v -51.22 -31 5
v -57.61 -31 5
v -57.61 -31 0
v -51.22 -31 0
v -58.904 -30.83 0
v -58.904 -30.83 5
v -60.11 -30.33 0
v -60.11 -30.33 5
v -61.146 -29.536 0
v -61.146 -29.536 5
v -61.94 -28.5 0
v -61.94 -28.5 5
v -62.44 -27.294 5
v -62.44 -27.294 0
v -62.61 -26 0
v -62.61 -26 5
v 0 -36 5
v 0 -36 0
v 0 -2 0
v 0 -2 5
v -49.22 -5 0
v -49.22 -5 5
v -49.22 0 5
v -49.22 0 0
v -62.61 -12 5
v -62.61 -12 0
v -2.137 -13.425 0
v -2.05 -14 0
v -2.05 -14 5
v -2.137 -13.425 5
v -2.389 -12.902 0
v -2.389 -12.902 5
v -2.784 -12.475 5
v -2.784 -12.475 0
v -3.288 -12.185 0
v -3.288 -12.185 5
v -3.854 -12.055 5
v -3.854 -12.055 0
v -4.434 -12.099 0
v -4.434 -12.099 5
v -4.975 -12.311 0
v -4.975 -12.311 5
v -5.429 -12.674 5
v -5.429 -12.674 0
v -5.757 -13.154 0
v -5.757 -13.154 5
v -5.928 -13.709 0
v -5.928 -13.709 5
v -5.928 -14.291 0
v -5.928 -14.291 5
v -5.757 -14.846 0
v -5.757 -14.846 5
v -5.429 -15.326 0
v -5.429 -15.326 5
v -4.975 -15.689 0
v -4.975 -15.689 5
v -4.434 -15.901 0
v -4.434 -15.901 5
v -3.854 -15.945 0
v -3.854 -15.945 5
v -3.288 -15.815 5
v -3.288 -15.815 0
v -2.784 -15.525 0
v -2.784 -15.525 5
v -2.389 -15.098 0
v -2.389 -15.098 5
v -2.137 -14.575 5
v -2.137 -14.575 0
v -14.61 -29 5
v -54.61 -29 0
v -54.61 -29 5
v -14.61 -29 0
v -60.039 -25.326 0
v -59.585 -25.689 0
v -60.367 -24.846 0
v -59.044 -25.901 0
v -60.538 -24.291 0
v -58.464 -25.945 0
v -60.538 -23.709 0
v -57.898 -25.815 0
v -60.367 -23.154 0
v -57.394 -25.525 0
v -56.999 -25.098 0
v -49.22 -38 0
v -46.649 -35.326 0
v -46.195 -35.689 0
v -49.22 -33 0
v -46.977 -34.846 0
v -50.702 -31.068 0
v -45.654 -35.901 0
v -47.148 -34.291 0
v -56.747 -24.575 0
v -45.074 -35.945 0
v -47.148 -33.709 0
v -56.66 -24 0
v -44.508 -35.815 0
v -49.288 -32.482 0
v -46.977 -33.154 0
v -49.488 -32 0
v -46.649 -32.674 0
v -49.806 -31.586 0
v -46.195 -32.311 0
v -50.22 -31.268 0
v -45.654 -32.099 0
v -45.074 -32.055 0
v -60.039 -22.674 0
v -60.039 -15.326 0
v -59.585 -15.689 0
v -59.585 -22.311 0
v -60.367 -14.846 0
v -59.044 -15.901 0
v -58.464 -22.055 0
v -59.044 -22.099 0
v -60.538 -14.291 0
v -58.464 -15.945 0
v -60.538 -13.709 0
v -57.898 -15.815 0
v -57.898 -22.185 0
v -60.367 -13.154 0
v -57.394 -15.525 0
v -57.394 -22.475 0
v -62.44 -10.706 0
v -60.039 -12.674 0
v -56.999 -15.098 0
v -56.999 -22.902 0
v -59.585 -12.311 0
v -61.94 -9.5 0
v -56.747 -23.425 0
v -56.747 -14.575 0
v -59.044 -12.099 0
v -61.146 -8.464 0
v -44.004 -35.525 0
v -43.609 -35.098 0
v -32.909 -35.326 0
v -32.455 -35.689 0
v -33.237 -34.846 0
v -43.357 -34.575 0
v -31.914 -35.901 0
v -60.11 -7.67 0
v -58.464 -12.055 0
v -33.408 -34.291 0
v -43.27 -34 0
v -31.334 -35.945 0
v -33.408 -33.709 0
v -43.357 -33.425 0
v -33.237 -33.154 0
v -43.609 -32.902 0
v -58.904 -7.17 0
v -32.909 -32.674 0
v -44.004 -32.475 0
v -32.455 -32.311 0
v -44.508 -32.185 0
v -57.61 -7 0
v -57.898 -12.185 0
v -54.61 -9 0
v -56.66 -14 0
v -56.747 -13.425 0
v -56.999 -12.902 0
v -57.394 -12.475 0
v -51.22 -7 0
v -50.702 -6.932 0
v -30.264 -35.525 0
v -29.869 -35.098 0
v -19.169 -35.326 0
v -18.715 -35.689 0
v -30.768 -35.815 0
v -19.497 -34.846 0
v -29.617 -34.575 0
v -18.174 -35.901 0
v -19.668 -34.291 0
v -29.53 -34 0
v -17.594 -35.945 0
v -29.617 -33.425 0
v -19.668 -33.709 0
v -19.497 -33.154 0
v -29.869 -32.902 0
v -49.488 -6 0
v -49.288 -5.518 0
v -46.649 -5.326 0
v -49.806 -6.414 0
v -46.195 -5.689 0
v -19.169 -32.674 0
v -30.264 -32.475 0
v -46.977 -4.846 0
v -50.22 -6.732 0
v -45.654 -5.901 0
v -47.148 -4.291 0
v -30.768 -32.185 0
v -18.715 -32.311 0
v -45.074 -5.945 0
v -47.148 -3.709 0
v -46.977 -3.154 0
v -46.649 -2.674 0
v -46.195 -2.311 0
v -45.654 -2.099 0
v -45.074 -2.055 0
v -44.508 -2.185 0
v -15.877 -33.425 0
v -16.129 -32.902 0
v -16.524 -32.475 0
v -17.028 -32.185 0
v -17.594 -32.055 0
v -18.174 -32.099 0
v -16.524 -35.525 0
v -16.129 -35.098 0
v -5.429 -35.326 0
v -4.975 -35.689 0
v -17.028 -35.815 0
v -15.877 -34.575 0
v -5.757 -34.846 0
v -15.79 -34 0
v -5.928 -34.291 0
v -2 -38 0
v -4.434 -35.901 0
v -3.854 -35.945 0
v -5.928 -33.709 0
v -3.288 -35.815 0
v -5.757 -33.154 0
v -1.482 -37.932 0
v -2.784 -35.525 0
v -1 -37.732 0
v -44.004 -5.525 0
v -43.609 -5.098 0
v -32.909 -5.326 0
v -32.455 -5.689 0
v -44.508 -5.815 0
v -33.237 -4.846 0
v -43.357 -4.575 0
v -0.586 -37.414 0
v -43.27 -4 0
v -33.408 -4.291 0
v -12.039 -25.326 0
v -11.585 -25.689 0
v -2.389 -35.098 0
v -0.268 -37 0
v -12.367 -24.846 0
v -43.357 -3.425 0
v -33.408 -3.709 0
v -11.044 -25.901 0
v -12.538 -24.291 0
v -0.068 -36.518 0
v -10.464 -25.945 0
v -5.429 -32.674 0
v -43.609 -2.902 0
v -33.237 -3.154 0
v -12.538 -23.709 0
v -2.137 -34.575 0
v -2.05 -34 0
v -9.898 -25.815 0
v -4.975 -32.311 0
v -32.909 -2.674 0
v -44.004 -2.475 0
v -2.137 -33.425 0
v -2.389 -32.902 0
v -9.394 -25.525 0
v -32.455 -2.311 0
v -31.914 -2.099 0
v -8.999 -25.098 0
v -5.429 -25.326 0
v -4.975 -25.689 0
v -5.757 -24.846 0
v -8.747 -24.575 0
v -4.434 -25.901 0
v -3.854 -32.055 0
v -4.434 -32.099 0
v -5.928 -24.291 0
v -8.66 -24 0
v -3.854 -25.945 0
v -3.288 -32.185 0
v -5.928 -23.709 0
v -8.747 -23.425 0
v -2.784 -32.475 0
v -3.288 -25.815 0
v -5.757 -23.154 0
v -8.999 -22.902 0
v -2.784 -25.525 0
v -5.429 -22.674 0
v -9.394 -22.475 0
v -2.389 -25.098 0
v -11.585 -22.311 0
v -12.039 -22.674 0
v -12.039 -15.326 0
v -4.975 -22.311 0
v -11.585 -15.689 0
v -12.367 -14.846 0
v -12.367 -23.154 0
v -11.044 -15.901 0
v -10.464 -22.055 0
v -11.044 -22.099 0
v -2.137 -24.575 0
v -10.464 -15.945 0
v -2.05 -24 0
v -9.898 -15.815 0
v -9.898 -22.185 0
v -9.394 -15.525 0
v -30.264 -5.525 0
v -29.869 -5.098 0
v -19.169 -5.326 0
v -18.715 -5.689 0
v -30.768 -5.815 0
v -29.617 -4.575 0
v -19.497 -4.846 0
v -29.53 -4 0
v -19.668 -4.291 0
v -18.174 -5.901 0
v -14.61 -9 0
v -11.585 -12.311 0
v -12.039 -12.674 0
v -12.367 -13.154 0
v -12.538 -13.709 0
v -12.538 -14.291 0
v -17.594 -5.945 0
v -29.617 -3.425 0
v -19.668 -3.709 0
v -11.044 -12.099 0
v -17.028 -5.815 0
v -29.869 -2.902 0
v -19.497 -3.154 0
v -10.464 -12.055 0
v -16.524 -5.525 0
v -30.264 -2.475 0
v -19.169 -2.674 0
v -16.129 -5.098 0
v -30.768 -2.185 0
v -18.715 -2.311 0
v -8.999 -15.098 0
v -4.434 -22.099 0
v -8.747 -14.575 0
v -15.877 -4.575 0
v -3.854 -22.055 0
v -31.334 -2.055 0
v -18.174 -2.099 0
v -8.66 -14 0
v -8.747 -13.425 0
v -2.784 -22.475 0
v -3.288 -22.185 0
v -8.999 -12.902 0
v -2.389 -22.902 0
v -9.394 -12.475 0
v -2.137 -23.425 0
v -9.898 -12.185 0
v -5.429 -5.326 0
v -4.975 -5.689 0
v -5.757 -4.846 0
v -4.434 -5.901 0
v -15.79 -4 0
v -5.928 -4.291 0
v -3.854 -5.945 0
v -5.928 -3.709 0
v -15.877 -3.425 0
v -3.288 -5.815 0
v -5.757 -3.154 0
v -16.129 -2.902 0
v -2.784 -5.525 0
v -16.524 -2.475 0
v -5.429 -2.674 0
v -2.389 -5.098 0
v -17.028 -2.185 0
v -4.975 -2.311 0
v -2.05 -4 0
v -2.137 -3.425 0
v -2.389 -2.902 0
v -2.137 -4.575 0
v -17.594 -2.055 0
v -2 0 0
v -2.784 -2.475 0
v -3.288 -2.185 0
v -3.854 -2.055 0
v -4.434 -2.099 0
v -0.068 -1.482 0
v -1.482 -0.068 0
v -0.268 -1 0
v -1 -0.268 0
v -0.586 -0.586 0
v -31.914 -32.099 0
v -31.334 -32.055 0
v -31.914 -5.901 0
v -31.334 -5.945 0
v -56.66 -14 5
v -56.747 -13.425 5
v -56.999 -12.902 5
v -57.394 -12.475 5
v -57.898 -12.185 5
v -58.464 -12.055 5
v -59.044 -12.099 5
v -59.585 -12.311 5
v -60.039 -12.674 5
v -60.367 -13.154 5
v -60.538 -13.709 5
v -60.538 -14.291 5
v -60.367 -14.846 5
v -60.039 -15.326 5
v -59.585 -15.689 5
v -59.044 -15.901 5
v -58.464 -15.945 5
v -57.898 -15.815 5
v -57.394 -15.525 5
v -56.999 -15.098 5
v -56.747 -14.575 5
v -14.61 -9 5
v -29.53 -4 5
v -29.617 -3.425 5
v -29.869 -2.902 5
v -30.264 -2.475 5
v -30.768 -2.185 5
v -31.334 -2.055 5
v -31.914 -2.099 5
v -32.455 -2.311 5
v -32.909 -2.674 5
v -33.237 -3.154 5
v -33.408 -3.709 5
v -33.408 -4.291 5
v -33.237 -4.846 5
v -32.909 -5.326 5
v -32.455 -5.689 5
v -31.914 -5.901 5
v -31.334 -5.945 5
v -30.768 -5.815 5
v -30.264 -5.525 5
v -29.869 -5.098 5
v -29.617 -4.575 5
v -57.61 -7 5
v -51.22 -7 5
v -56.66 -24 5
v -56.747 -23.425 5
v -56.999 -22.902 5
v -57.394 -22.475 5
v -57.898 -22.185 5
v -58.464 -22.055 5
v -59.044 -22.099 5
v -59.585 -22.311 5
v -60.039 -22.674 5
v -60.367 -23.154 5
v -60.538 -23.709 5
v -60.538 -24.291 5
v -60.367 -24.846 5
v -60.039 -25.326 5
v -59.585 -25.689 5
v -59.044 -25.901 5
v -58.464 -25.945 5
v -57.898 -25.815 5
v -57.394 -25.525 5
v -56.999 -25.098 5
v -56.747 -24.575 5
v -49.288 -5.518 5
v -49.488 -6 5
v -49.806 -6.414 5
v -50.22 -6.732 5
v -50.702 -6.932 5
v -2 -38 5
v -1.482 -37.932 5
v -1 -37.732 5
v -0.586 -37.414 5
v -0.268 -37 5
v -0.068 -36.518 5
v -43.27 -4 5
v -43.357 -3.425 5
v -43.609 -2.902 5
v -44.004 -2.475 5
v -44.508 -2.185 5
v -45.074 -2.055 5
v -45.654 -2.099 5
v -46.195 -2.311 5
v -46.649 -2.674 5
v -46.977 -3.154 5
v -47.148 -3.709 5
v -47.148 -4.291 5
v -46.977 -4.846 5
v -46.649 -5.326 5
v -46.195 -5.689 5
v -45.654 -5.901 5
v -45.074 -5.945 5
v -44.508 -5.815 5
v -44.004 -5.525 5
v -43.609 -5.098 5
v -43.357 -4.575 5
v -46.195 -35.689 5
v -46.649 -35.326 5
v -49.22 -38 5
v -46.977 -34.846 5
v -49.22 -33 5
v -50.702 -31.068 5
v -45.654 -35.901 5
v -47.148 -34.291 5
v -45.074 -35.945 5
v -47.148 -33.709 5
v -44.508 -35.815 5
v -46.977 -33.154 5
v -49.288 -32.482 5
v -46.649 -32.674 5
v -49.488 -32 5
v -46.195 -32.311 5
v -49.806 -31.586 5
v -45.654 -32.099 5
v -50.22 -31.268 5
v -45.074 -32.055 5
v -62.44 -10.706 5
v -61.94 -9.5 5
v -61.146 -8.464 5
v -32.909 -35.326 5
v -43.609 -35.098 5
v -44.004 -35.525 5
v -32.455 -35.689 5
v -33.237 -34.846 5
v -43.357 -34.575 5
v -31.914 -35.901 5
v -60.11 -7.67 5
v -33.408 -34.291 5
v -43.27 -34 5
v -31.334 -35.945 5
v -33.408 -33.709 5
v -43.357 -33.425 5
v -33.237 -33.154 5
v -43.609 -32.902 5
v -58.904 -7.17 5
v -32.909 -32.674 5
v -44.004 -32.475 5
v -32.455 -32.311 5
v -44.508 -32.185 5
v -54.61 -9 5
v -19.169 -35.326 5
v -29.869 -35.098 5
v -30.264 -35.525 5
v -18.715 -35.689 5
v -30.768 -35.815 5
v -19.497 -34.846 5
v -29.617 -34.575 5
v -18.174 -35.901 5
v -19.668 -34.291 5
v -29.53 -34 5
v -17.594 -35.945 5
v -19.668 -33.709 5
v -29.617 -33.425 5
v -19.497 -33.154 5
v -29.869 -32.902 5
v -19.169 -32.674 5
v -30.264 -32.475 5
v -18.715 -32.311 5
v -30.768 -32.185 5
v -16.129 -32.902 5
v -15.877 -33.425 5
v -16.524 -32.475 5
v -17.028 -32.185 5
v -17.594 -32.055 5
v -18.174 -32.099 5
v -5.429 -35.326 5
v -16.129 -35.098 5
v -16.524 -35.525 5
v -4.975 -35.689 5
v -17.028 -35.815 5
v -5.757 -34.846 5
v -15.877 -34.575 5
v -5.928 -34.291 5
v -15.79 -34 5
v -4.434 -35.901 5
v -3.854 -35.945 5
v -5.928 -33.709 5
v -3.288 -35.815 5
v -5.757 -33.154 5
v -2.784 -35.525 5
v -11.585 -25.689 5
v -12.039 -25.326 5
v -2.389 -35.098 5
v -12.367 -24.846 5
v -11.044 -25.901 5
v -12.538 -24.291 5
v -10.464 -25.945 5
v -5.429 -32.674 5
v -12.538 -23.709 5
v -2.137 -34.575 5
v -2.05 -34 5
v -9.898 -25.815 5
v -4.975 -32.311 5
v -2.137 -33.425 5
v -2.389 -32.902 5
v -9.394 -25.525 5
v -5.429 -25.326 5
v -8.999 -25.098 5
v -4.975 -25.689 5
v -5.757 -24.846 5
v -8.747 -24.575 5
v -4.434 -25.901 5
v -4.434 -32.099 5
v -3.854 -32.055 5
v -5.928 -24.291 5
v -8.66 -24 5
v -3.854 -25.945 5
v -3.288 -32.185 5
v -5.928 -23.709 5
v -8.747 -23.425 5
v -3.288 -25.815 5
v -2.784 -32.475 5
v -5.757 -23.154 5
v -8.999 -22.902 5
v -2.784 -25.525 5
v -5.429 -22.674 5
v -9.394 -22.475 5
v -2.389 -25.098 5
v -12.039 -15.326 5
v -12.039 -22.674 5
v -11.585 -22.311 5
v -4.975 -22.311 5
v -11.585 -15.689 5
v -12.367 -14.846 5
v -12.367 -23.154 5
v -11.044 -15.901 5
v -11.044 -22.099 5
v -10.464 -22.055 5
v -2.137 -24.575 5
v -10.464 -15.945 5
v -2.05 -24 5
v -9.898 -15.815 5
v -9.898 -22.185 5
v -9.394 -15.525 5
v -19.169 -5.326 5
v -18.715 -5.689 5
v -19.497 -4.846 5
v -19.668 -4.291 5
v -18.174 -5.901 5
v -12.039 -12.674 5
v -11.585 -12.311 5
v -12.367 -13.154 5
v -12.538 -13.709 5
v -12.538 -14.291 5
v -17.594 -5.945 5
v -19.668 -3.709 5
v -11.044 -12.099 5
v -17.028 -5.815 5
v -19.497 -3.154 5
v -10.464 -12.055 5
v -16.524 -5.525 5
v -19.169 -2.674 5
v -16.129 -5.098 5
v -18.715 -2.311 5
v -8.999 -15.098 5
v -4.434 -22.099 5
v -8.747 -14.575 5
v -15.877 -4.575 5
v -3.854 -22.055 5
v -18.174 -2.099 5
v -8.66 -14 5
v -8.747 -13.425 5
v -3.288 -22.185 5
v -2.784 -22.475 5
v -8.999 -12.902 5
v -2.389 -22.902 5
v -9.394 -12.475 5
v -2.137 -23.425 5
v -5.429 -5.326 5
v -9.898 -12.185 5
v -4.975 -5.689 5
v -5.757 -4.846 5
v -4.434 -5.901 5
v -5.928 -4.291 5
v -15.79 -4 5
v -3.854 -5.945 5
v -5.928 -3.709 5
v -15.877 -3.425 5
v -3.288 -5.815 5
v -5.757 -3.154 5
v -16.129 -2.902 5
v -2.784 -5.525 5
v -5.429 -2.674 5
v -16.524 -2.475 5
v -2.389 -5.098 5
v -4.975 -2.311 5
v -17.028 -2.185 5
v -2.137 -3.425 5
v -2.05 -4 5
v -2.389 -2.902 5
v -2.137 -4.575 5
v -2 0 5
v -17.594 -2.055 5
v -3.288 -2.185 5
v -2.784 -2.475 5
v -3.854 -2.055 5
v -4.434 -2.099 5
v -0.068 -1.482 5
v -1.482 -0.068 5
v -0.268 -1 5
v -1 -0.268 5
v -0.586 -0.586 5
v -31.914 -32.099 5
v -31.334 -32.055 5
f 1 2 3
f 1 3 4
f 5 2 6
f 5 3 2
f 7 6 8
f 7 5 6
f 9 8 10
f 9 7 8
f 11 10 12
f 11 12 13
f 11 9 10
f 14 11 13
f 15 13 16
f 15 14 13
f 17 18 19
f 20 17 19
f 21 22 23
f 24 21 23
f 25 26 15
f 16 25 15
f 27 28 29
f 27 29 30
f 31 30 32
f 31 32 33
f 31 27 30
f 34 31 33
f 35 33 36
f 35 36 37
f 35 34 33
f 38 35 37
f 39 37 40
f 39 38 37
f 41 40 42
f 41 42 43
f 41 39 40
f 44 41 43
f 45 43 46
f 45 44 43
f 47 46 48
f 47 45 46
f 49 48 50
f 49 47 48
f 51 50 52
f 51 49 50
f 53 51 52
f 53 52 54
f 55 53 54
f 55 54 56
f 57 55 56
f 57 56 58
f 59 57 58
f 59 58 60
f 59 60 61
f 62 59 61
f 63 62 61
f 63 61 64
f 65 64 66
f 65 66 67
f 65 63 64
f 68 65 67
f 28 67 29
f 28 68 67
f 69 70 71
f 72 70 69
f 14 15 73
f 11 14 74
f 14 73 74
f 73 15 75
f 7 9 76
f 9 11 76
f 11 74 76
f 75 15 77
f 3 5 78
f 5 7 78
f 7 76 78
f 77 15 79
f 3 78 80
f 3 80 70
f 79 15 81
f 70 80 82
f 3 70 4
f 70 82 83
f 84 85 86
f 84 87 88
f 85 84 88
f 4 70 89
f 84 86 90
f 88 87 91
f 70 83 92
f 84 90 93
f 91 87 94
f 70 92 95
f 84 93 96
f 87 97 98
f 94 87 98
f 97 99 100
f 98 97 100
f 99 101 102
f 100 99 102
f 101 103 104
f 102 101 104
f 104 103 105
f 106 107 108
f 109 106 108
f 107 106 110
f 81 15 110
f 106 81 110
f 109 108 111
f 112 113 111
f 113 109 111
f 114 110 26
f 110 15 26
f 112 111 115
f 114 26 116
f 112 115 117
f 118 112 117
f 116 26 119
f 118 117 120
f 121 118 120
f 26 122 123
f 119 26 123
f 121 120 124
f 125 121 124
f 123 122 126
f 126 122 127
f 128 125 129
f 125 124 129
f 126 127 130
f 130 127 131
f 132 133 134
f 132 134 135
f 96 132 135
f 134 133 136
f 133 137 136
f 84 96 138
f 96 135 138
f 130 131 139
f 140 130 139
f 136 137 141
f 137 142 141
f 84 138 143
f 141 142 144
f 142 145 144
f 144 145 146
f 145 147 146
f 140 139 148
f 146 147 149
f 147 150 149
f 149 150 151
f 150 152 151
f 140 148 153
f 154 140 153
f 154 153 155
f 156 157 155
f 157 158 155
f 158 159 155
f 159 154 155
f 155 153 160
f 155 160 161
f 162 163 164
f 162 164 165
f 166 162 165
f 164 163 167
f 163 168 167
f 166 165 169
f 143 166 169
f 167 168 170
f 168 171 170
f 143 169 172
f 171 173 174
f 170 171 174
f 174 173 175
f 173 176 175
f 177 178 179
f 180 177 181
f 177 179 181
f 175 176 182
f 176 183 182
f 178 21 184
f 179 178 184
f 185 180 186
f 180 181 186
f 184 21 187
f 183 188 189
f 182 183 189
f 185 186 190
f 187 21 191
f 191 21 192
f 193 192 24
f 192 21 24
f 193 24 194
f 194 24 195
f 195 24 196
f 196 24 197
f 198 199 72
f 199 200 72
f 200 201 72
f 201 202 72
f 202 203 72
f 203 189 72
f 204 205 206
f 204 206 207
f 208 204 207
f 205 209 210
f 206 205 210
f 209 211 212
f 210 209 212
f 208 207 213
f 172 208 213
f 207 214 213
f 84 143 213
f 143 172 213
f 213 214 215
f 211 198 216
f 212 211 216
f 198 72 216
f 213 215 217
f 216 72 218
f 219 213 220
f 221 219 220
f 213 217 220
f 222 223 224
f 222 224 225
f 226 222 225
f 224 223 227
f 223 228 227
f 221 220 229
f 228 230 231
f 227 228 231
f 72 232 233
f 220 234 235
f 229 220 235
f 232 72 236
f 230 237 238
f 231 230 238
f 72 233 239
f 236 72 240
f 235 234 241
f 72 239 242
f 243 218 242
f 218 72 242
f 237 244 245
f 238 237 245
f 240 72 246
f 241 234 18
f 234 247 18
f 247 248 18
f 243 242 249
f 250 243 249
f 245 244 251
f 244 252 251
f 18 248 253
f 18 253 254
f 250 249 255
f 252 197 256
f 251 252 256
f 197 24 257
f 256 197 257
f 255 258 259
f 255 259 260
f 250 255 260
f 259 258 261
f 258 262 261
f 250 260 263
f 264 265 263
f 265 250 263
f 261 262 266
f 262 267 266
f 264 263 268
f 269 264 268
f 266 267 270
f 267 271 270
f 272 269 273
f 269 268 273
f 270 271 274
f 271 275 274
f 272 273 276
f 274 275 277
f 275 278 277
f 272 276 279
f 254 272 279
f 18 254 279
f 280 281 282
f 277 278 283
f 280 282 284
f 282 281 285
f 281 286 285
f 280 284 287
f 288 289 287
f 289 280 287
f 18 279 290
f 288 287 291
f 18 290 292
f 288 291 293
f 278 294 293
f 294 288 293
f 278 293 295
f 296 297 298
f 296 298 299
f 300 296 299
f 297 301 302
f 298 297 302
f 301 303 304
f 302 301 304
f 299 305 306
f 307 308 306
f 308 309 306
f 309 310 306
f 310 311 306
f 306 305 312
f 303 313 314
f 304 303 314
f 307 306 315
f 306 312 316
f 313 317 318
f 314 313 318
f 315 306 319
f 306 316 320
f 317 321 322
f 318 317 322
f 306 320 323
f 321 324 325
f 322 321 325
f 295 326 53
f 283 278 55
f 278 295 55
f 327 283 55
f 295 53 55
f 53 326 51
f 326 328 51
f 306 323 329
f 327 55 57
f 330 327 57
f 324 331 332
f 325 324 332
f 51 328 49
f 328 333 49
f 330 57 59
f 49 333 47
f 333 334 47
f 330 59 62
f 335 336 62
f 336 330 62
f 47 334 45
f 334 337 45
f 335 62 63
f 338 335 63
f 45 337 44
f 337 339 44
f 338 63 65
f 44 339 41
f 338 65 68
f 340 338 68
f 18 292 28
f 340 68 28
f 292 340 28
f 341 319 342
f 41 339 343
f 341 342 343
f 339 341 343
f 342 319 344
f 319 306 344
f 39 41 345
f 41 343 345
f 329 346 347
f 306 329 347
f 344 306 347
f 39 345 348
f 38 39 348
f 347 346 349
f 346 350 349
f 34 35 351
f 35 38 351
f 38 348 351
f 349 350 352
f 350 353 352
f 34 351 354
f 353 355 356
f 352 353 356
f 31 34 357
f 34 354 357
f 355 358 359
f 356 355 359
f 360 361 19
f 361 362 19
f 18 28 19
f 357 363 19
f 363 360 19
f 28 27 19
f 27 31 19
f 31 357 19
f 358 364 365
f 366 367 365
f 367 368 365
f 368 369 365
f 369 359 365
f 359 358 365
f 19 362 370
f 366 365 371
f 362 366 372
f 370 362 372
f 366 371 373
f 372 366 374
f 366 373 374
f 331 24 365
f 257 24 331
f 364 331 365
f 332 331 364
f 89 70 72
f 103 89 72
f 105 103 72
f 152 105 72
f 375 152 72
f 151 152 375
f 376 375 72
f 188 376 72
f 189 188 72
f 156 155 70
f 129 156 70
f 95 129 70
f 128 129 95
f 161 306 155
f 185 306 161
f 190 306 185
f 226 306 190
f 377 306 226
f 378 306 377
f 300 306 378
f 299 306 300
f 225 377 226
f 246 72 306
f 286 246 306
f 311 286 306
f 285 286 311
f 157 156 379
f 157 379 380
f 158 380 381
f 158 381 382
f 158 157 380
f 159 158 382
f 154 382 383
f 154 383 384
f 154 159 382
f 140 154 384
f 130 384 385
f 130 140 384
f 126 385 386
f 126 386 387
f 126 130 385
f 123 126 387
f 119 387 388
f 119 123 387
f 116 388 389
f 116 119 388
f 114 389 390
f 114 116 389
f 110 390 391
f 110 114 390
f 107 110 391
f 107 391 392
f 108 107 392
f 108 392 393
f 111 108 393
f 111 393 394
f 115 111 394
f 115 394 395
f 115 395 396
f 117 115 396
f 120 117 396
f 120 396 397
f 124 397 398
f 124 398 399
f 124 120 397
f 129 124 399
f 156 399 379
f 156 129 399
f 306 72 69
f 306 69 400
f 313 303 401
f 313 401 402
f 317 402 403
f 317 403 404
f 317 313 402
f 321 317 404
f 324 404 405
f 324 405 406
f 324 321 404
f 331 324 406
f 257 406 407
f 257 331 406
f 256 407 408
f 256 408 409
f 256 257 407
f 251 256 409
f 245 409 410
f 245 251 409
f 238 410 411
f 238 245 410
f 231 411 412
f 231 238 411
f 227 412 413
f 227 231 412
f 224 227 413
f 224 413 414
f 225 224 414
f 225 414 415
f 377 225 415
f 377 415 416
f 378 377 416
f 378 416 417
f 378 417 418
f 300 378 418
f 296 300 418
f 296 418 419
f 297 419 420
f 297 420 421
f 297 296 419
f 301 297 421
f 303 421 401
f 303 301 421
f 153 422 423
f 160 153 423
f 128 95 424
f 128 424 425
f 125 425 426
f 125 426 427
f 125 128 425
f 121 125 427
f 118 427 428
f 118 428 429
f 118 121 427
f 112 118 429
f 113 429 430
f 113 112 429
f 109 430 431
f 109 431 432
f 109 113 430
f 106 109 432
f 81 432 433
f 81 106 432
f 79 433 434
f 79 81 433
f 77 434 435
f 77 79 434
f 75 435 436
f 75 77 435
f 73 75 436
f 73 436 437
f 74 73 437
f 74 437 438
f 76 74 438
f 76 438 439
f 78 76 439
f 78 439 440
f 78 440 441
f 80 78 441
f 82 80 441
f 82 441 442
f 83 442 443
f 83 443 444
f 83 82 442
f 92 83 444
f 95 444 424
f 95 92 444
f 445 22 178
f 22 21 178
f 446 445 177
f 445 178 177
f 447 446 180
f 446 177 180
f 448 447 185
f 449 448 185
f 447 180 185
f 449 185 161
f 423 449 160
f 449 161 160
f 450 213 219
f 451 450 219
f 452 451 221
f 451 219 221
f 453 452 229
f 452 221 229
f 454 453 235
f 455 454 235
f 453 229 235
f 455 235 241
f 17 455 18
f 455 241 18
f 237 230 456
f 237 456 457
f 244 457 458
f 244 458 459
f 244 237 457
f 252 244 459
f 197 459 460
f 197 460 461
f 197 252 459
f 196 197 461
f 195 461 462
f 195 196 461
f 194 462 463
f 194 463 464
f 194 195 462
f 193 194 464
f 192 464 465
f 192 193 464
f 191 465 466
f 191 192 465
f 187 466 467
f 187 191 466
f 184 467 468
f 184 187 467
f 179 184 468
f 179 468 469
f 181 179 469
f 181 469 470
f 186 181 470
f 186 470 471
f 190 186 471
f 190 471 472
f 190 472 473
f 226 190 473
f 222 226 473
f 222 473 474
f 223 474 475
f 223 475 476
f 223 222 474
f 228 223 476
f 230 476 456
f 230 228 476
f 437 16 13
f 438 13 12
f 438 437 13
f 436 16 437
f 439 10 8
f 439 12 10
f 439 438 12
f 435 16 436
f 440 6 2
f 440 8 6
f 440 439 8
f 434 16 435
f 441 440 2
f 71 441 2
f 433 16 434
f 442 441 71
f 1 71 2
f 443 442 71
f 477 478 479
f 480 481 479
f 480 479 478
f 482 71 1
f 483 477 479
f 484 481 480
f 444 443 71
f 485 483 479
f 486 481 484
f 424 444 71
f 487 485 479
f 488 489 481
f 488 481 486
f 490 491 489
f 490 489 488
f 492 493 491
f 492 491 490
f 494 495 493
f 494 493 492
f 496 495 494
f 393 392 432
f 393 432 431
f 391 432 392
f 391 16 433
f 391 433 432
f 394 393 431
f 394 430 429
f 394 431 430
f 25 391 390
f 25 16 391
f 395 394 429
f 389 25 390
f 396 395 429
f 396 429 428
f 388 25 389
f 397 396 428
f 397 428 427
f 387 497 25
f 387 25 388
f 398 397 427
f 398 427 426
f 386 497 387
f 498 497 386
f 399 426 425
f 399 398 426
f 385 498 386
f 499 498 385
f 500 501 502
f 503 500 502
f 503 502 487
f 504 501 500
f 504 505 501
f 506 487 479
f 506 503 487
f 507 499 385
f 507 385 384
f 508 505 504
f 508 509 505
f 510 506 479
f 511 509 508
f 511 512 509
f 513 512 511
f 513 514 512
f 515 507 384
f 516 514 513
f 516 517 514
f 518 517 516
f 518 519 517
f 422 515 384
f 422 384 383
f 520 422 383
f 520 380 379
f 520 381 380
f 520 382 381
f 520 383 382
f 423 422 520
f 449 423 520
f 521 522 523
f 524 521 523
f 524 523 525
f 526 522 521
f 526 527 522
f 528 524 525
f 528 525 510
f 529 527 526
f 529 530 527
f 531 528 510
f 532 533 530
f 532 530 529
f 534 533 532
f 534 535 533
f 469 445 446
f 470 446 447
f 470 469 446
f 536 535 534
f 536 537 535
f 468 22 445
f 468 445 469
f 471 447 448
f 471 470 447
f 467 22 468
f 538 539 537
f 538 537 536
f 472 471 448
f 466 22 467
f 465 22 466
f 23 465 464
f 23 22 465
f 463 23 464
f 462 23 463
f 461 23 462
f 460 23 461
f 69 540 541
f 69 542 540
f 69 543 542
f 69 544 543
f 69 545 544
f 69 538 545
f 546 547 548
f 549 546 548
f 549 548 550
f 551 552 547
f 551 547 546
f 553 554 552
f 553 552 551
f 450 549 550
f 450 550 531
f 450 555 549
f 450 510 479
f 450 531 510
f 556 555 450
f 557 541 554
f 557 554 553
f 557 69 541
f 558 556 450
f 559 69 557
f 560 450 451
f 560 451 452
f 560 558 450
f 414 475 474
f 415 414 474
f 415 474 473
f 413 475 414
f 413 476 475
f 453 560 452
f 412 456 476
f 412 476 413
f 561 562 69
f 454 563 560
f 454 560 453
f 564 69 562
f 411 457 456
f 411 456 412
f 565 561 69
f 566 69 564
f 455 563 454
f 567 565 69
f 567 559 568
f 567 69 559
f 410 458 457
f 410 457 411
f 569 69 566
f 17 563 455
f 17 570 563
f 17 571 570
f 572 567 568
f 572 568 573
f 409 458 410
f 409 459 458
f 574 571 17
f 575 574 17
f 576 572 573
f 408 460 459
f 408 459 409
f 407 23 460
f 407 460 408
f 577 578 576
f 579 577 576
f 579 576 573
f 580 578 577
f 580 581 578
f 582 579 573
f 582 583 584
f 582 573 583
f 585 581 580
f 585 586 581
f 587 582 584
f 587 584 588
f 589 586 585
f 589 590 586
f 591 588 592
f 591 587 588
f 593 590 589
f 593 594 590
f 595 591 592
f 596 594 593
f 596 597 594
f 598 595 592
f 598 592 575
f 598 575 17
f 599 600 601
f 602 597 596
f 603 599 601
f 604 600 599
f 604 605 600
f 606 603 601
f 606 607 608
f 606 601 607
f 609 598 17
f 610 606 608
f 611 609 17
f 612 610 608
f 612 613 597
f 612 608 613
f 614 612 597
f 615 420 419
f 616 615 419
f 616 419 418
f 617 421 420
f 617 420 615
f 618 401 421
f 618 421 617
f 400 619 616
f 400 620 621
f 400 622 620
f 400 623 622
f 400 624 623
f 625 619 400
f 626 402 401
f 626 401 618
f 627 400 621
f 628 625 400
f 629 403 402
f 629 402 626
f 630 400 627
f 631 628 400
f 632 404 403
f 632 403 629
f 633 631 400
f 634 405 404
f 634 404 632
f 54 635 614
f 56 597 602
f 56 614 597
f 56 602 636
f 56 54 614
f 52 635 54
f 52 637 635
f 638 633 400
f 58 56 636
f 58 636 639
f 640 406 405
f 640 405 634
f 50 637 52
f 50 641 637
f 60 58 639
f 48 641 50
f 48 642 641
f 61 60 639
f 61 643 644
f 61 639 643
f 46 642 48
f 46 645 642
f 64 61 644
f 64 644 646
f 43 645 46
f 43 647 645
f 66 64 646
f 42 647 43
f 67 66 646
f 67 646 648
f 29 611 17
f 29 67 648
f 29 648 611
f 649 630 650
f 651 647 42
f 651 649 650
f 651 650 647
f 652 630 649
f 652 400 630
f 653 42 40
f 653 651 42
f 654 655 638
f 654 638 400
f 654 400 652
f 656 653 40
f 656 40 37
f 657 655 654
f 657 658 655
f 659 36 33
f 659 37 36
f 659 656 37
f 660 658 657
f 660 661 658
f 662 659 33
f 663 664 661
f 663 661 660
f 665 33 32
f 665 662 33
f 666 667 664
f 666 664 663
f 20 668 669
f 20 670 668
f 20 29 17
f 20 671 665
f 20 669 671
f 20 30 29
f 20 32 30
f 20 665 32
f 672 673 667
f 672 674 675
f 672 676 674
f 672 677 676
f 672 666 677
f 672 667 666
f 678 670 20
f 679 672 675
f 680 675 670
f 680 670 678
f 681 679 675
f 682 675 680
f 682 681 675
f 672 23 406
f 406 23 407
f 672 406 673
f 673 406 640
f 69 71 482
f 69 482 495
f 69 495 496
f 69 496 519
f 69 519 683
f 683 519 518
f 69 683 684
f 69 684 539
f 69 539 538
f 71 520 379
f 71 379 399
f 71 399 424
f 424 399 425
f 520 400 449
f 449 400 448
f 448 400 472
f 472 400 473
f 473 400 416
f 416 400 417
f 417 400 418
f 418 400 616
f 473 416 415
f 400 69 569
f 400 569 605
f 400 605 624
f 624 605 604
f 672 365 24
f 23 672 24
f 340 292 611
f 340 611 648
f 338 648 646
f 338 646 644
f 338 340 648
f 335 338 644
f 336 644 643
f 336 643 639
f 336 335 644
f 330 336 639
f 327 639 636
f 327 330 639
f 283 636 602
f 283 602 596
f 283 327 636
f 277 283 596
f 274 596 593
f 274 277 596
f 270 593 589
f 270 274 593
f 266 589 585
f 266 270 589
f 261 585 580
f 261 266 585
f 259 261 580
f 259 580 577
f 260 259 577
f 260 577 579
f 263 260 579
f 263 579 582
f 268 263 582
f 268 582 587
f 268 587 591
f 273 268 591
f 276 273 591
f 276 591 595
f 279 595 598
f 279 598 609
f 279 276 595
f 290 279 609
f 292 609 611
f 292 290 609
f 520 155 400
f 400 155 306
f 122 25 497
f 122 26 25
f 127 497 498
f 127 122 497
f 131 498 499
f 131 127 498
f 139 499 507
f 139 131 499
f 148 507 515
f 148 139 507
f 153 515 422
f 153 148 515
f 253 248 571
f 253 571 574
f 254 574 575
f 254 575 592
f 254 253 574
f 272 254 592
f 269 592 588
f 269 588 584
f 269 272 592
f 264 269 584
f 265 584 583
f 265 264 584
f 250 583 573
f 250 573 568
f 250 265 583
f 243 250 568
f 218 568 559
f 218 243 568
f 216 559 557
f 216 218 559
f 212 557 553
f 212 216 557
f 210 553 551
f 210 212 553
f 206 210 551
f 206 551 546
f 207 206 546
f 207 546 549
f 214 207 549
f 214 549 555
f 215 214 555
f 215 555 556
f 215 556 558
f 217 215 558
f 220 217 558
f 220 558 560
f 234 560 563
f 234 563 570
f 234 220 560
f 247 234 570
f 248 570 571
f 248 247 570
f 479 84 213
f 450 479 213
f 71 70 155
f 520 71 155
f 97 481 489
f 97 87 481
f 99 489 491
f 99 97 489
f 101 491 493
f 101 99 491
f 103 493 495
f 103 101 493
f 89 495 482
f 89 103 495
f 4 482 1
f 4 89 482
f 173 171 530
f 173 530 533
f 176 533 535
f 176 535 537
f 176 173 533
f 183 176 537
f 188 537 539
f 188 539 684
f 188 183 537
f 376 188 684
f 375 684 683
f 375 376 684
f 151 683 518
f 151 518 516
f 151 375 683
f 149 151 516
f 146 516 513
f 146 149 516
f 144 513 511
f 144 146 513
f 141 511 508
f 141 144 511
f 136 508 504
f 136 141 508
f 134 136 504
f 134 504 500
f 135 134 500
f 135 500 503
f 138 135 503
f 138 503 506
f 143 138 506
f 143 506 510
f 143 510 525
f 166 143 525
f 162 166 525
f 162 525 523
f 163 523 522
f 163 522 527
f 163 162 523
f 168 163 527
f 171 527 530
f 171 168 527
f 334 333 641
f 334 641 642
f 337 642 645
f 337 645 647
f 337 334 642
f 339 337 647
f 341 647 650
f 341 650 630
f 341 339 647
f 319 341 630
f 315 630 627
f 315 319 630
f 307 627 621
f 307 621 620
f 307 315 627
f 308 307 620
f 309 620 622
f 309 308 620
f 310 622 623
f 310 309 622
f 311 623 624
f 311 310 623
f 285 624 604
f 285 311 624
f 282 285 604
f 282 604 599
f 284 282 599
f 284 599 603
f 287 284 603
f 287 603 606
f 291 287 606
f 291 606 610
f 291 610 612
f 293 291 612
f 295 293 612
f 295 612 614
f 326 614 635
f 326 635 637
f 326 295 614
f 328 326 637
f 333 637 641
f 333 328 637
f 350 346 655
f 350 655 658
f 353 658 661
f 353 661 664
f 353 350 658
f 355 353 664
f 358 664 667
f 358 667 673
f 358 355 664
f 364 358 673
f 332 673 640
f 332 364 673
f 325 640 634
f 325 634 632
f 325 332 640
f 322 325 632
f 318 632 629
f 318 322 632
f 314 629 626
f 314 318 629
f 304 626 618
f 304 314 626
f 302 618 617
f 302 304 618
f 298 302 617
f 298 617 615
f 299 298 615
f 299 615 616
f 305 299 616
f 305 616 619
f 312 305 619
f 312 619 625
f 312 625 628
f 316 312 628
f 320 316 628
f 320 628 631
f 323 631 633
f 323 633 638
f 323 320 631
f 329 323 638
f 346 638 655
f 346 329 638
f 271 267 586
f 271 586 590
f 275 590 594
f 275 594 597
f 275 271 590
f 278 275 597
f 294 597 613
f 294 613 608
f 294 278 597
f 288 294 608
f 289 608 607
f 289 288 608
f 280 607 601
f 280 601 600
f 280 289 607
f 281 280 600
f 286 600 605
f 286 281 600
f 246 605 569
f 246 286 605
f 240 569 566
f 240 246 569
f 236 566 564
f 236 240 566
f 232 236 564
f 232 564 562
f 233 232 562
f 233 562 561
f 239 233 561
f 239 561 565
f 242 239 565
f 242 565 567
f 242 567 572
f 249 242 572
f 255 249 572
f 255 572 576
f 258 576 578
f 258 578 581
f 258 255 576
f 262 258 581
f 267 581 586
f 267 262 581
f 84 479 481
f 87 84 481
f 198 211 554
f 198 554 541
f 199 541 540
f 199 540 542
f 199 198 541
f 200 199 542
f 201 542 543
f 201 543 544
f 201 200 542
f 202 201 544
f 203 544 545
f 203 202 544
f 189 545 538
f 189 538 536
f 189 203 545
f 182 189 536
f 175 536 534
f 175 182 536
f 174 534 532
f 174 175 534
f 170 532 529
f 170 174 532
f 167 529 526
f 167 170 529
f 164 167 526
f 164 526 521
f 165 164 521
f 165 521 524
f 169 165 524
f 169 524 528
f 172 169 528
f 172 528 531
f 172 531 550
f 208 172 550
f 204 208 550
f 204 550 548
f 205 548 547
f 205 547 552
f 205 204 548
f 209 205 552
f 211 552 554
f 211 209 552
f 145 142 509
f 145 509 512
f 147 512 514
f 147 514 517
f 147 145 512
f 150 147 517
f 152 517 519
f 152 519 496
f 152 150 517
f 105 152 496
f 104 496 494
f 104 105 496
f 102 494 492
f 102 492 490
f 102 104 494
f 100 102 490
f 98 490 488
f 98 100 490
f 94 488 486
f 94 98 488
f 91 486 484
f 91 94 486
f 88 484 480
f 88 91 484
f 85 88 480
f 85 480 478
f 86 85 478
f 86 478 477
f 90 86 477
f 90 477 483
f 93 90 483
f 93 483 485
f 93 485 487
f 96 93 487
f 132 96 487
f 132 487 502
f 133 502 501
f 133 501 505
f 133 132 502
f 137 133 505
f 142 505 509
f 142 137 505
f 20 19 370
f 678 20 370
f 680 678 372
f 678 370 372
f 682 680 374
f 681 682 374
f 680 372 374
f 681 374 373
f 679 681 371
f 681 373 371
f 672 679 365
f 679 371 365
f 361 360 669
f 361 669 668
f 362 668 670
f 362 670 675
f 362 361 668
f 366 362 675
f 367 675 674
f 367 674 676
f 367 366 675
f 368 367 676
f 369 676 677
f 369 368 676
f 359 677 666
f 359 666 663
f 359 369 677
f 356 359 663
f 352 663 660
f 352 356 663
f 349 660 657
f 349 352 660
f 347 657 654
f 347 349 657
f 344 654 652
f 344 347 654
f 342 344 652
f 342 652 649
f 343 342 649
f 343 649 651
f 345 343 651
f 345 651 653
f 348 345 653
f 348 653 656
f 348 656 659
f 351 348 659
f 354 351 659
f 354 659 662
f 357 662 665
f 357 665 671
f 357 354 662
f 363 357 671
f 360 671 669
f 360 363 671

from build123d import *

# Parameters (mm, degrees)
SKETCH1_R           = 1.95
SKETCH1_W           = 40
SKETCH1_H           = 20
BOSS_EXTRUDE1_DEPTH = 5
SKETCH2_W           = 13.39
SKETCH2_H           = 7
CUT_EXTRUDE2_DEPTH  = 6
FILLET1_R           = 2
FILLET2_R           = 5


with BuildPart() as part:
    # Sketch1 → Boss-Extrude1 (new body)
    with BuildSketch(Plane.XY):
        with BuildLine():
            Line((-2, 0), (-60.61, 0))
            ThreePointArc((-60.61, 0), (-62.024213562, -0.585786438), (-62.61, -2))
            Line((-62.61, -2), (-62.61, -36))
            ThreePointArc((-62.61, -36), (-62.024213562, -37.414213562), (-60.61, -38))
            Line((-60.61, -38), (-2, -38))
            ThreePointArc((-2, -38), (-0.585786438, -37.414213562), (0, -36))
            Line((0, -36), (0, -2))
            ThreePointArc((0, -2), (-0.585786438, -0.585786438), (-2, 0))
        make_face()
        with Locations((-10.61, -14)):
            Circle(SKETCH1_R, mode=Mode.SUBTRACT)
        with Locations((-10.61, -24)):
            Circle(SKETCH1_R, mode=Mode.SUBTRACT)
        with Locations((-58.61, -24)):
            Circle(SKETCH1_R, mode=Mode.SUBTRACT)
        with Locations((-58.61, -14)):
            Circle(SKETCH1_R, mode=Mode.SUBTRACT)
        with Locations((-45.22, -4)):
            Circle(SKETCH1_R, mode=Mode.SUBTRACT)
        with Locations((-4, -4)):
            Circle(SKETCH1_R, mode=Mode.SUBTRACT)
        with Locations((-4, -14)):
            Circle(SKETCH1_R, mode=Mode.SUBTRACT)
        with Locations((-58.61, -4)):
            Circle(SKETCH1_R, mode=Mode.SUBTRACT)
        with Locations((-31.48, -4)):
            Circle(SKETCH1_R, mode=Mode.SUBTRACT)
        with Locations((-17.74, -4)):
            Circle(SKETCH1_R, mode=Mode.SUBTRACT)
        with Locations((-45.22, -34)):
            Circle(SKETCH1_R, mode=Mode.SUBTRACT)
        with Locations((-58.61, -34)):
            Circle(SKETCH1_R, mode=Mode.SUBTRACT)
        with Locations((-4, -34)):
            Circle(SKETCH1_R, mode=Mode.SUBTRACT)
        with Locations((-17.74, -34)):
            Circle(SKETCH1_R, mode=Mode.SUBTRACT)
        with Locations((-31.48, -34)):
            Circle(SKETCH1_R, mode=Mode.SUBTRACT)
        with Locations((-4, -24)):
            Circle(SKETCH1_R, mode=Mode.SUBTRACT)
        with Locations((-34.61, -19)):
            Rectangle(SKETCH1_W, SKETCH1_H, mode=Mode.SUBTRACT)
    extrude(amount=BOSS_EXTRUDE1_DEPTH)

    # Sketch2 → Cut-Extrude2 (cut, through all)
    with BuildSketch(Plane.XY.offset(5)):
        with Locations((-55.915, -3.5)):
            Rectangle(SKETCH2_W, SKETCH2_H)
        with Locations((-55.915, -34.5)):
            Rectangle(SKETCH2_W, SKETCH2_H)
    extrude(amount=-CUT_EXTRUDE2_DEPTH, mode=Mode.SUBTRACT)

    # Fillet1
    fillet1_edges = [part.edges().sort_by_distance(p)[0] for p in [
        (-49.22, -7, 2.5),
        (-49.22, -31, 2.5),
    ]]
    fillet(fillet1_edges, radius=FILLET1_R)

    # Fillet2
    fillet2_edges = [part.edges().sort_by_distance(p)[0] for p in [
        (-62.61, -7, 2.5),
        (-62.61, -31, 2.5),
    ]]
    fillet(fillet2_edges, radius=FILLET2_R)


solid = part.part
